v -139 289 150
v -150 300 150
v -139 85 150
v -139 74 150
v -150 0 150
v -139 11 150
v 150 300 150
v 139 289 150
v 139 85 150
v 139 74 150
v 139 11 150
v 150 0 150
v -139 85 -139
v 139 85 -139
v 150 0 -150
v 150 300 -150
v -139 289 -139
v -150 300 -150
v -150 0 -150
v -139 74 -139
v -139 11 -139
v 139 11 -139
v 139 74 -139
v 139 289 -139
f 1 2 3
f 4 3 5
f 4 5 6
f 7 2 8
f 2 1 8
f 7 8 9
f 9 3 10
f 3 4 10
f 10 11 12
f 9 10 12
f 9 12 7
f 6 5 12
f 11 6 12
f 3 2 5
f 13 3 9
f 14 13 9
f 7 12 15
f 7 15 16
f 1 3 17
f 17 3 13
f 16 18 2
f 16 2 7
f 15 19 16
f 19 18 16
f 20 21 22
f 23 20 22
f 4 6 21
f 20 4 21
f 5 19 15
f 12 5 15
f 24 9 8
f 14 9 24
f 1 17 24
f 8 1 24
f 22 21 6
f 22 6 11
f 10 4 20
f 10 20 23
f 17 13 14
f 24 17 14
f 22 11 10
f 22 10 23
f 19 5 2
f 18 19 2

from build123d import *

# Parameters (mm, degrees)
SKETCH_1_W      = 300
SKETCH_1_H      = 300
EXTRUDE_1_DEPTH = 300
SHELL_1_T       = -11
SKETCH_3_W      = 300
SKETCH_3_H      = 11
EXTRUDE_2_DEPTH = 300


with BuildPart() as part:
    # 草图1 → 凸台-拉伸1 (new body)
    with BuildSketch(Plane(origin=(0, 0, 0), x_dir=(1, 0, 0), z_dir=(0, 1, 0))):
        Rectangle(SKETCH_1_W, SKETCH_1_H)
    extrude(amount=EXTRUDE_1_DEPTH)

    # 抽壳1
    shell_1_openings = [part.faces().sort_by_distance(p)[0] for p in [
        (0, 150, 150),
    ]]
    offset(amount=SHELL_1_T, openings=shell_1_openings, kind=Kind.INTERSECTION)

    # 草图3 → 凸台-拉伸2 (add)
    with BuildSketch(Plane.XY.offset(150)):
        with Locations((0, 79.5)):
            Rectangle(SKETCH_3_W, SKETCH_3_H)
    extrude(amount=-EXTRUDE_2_DEPTH)


solid = part.part
